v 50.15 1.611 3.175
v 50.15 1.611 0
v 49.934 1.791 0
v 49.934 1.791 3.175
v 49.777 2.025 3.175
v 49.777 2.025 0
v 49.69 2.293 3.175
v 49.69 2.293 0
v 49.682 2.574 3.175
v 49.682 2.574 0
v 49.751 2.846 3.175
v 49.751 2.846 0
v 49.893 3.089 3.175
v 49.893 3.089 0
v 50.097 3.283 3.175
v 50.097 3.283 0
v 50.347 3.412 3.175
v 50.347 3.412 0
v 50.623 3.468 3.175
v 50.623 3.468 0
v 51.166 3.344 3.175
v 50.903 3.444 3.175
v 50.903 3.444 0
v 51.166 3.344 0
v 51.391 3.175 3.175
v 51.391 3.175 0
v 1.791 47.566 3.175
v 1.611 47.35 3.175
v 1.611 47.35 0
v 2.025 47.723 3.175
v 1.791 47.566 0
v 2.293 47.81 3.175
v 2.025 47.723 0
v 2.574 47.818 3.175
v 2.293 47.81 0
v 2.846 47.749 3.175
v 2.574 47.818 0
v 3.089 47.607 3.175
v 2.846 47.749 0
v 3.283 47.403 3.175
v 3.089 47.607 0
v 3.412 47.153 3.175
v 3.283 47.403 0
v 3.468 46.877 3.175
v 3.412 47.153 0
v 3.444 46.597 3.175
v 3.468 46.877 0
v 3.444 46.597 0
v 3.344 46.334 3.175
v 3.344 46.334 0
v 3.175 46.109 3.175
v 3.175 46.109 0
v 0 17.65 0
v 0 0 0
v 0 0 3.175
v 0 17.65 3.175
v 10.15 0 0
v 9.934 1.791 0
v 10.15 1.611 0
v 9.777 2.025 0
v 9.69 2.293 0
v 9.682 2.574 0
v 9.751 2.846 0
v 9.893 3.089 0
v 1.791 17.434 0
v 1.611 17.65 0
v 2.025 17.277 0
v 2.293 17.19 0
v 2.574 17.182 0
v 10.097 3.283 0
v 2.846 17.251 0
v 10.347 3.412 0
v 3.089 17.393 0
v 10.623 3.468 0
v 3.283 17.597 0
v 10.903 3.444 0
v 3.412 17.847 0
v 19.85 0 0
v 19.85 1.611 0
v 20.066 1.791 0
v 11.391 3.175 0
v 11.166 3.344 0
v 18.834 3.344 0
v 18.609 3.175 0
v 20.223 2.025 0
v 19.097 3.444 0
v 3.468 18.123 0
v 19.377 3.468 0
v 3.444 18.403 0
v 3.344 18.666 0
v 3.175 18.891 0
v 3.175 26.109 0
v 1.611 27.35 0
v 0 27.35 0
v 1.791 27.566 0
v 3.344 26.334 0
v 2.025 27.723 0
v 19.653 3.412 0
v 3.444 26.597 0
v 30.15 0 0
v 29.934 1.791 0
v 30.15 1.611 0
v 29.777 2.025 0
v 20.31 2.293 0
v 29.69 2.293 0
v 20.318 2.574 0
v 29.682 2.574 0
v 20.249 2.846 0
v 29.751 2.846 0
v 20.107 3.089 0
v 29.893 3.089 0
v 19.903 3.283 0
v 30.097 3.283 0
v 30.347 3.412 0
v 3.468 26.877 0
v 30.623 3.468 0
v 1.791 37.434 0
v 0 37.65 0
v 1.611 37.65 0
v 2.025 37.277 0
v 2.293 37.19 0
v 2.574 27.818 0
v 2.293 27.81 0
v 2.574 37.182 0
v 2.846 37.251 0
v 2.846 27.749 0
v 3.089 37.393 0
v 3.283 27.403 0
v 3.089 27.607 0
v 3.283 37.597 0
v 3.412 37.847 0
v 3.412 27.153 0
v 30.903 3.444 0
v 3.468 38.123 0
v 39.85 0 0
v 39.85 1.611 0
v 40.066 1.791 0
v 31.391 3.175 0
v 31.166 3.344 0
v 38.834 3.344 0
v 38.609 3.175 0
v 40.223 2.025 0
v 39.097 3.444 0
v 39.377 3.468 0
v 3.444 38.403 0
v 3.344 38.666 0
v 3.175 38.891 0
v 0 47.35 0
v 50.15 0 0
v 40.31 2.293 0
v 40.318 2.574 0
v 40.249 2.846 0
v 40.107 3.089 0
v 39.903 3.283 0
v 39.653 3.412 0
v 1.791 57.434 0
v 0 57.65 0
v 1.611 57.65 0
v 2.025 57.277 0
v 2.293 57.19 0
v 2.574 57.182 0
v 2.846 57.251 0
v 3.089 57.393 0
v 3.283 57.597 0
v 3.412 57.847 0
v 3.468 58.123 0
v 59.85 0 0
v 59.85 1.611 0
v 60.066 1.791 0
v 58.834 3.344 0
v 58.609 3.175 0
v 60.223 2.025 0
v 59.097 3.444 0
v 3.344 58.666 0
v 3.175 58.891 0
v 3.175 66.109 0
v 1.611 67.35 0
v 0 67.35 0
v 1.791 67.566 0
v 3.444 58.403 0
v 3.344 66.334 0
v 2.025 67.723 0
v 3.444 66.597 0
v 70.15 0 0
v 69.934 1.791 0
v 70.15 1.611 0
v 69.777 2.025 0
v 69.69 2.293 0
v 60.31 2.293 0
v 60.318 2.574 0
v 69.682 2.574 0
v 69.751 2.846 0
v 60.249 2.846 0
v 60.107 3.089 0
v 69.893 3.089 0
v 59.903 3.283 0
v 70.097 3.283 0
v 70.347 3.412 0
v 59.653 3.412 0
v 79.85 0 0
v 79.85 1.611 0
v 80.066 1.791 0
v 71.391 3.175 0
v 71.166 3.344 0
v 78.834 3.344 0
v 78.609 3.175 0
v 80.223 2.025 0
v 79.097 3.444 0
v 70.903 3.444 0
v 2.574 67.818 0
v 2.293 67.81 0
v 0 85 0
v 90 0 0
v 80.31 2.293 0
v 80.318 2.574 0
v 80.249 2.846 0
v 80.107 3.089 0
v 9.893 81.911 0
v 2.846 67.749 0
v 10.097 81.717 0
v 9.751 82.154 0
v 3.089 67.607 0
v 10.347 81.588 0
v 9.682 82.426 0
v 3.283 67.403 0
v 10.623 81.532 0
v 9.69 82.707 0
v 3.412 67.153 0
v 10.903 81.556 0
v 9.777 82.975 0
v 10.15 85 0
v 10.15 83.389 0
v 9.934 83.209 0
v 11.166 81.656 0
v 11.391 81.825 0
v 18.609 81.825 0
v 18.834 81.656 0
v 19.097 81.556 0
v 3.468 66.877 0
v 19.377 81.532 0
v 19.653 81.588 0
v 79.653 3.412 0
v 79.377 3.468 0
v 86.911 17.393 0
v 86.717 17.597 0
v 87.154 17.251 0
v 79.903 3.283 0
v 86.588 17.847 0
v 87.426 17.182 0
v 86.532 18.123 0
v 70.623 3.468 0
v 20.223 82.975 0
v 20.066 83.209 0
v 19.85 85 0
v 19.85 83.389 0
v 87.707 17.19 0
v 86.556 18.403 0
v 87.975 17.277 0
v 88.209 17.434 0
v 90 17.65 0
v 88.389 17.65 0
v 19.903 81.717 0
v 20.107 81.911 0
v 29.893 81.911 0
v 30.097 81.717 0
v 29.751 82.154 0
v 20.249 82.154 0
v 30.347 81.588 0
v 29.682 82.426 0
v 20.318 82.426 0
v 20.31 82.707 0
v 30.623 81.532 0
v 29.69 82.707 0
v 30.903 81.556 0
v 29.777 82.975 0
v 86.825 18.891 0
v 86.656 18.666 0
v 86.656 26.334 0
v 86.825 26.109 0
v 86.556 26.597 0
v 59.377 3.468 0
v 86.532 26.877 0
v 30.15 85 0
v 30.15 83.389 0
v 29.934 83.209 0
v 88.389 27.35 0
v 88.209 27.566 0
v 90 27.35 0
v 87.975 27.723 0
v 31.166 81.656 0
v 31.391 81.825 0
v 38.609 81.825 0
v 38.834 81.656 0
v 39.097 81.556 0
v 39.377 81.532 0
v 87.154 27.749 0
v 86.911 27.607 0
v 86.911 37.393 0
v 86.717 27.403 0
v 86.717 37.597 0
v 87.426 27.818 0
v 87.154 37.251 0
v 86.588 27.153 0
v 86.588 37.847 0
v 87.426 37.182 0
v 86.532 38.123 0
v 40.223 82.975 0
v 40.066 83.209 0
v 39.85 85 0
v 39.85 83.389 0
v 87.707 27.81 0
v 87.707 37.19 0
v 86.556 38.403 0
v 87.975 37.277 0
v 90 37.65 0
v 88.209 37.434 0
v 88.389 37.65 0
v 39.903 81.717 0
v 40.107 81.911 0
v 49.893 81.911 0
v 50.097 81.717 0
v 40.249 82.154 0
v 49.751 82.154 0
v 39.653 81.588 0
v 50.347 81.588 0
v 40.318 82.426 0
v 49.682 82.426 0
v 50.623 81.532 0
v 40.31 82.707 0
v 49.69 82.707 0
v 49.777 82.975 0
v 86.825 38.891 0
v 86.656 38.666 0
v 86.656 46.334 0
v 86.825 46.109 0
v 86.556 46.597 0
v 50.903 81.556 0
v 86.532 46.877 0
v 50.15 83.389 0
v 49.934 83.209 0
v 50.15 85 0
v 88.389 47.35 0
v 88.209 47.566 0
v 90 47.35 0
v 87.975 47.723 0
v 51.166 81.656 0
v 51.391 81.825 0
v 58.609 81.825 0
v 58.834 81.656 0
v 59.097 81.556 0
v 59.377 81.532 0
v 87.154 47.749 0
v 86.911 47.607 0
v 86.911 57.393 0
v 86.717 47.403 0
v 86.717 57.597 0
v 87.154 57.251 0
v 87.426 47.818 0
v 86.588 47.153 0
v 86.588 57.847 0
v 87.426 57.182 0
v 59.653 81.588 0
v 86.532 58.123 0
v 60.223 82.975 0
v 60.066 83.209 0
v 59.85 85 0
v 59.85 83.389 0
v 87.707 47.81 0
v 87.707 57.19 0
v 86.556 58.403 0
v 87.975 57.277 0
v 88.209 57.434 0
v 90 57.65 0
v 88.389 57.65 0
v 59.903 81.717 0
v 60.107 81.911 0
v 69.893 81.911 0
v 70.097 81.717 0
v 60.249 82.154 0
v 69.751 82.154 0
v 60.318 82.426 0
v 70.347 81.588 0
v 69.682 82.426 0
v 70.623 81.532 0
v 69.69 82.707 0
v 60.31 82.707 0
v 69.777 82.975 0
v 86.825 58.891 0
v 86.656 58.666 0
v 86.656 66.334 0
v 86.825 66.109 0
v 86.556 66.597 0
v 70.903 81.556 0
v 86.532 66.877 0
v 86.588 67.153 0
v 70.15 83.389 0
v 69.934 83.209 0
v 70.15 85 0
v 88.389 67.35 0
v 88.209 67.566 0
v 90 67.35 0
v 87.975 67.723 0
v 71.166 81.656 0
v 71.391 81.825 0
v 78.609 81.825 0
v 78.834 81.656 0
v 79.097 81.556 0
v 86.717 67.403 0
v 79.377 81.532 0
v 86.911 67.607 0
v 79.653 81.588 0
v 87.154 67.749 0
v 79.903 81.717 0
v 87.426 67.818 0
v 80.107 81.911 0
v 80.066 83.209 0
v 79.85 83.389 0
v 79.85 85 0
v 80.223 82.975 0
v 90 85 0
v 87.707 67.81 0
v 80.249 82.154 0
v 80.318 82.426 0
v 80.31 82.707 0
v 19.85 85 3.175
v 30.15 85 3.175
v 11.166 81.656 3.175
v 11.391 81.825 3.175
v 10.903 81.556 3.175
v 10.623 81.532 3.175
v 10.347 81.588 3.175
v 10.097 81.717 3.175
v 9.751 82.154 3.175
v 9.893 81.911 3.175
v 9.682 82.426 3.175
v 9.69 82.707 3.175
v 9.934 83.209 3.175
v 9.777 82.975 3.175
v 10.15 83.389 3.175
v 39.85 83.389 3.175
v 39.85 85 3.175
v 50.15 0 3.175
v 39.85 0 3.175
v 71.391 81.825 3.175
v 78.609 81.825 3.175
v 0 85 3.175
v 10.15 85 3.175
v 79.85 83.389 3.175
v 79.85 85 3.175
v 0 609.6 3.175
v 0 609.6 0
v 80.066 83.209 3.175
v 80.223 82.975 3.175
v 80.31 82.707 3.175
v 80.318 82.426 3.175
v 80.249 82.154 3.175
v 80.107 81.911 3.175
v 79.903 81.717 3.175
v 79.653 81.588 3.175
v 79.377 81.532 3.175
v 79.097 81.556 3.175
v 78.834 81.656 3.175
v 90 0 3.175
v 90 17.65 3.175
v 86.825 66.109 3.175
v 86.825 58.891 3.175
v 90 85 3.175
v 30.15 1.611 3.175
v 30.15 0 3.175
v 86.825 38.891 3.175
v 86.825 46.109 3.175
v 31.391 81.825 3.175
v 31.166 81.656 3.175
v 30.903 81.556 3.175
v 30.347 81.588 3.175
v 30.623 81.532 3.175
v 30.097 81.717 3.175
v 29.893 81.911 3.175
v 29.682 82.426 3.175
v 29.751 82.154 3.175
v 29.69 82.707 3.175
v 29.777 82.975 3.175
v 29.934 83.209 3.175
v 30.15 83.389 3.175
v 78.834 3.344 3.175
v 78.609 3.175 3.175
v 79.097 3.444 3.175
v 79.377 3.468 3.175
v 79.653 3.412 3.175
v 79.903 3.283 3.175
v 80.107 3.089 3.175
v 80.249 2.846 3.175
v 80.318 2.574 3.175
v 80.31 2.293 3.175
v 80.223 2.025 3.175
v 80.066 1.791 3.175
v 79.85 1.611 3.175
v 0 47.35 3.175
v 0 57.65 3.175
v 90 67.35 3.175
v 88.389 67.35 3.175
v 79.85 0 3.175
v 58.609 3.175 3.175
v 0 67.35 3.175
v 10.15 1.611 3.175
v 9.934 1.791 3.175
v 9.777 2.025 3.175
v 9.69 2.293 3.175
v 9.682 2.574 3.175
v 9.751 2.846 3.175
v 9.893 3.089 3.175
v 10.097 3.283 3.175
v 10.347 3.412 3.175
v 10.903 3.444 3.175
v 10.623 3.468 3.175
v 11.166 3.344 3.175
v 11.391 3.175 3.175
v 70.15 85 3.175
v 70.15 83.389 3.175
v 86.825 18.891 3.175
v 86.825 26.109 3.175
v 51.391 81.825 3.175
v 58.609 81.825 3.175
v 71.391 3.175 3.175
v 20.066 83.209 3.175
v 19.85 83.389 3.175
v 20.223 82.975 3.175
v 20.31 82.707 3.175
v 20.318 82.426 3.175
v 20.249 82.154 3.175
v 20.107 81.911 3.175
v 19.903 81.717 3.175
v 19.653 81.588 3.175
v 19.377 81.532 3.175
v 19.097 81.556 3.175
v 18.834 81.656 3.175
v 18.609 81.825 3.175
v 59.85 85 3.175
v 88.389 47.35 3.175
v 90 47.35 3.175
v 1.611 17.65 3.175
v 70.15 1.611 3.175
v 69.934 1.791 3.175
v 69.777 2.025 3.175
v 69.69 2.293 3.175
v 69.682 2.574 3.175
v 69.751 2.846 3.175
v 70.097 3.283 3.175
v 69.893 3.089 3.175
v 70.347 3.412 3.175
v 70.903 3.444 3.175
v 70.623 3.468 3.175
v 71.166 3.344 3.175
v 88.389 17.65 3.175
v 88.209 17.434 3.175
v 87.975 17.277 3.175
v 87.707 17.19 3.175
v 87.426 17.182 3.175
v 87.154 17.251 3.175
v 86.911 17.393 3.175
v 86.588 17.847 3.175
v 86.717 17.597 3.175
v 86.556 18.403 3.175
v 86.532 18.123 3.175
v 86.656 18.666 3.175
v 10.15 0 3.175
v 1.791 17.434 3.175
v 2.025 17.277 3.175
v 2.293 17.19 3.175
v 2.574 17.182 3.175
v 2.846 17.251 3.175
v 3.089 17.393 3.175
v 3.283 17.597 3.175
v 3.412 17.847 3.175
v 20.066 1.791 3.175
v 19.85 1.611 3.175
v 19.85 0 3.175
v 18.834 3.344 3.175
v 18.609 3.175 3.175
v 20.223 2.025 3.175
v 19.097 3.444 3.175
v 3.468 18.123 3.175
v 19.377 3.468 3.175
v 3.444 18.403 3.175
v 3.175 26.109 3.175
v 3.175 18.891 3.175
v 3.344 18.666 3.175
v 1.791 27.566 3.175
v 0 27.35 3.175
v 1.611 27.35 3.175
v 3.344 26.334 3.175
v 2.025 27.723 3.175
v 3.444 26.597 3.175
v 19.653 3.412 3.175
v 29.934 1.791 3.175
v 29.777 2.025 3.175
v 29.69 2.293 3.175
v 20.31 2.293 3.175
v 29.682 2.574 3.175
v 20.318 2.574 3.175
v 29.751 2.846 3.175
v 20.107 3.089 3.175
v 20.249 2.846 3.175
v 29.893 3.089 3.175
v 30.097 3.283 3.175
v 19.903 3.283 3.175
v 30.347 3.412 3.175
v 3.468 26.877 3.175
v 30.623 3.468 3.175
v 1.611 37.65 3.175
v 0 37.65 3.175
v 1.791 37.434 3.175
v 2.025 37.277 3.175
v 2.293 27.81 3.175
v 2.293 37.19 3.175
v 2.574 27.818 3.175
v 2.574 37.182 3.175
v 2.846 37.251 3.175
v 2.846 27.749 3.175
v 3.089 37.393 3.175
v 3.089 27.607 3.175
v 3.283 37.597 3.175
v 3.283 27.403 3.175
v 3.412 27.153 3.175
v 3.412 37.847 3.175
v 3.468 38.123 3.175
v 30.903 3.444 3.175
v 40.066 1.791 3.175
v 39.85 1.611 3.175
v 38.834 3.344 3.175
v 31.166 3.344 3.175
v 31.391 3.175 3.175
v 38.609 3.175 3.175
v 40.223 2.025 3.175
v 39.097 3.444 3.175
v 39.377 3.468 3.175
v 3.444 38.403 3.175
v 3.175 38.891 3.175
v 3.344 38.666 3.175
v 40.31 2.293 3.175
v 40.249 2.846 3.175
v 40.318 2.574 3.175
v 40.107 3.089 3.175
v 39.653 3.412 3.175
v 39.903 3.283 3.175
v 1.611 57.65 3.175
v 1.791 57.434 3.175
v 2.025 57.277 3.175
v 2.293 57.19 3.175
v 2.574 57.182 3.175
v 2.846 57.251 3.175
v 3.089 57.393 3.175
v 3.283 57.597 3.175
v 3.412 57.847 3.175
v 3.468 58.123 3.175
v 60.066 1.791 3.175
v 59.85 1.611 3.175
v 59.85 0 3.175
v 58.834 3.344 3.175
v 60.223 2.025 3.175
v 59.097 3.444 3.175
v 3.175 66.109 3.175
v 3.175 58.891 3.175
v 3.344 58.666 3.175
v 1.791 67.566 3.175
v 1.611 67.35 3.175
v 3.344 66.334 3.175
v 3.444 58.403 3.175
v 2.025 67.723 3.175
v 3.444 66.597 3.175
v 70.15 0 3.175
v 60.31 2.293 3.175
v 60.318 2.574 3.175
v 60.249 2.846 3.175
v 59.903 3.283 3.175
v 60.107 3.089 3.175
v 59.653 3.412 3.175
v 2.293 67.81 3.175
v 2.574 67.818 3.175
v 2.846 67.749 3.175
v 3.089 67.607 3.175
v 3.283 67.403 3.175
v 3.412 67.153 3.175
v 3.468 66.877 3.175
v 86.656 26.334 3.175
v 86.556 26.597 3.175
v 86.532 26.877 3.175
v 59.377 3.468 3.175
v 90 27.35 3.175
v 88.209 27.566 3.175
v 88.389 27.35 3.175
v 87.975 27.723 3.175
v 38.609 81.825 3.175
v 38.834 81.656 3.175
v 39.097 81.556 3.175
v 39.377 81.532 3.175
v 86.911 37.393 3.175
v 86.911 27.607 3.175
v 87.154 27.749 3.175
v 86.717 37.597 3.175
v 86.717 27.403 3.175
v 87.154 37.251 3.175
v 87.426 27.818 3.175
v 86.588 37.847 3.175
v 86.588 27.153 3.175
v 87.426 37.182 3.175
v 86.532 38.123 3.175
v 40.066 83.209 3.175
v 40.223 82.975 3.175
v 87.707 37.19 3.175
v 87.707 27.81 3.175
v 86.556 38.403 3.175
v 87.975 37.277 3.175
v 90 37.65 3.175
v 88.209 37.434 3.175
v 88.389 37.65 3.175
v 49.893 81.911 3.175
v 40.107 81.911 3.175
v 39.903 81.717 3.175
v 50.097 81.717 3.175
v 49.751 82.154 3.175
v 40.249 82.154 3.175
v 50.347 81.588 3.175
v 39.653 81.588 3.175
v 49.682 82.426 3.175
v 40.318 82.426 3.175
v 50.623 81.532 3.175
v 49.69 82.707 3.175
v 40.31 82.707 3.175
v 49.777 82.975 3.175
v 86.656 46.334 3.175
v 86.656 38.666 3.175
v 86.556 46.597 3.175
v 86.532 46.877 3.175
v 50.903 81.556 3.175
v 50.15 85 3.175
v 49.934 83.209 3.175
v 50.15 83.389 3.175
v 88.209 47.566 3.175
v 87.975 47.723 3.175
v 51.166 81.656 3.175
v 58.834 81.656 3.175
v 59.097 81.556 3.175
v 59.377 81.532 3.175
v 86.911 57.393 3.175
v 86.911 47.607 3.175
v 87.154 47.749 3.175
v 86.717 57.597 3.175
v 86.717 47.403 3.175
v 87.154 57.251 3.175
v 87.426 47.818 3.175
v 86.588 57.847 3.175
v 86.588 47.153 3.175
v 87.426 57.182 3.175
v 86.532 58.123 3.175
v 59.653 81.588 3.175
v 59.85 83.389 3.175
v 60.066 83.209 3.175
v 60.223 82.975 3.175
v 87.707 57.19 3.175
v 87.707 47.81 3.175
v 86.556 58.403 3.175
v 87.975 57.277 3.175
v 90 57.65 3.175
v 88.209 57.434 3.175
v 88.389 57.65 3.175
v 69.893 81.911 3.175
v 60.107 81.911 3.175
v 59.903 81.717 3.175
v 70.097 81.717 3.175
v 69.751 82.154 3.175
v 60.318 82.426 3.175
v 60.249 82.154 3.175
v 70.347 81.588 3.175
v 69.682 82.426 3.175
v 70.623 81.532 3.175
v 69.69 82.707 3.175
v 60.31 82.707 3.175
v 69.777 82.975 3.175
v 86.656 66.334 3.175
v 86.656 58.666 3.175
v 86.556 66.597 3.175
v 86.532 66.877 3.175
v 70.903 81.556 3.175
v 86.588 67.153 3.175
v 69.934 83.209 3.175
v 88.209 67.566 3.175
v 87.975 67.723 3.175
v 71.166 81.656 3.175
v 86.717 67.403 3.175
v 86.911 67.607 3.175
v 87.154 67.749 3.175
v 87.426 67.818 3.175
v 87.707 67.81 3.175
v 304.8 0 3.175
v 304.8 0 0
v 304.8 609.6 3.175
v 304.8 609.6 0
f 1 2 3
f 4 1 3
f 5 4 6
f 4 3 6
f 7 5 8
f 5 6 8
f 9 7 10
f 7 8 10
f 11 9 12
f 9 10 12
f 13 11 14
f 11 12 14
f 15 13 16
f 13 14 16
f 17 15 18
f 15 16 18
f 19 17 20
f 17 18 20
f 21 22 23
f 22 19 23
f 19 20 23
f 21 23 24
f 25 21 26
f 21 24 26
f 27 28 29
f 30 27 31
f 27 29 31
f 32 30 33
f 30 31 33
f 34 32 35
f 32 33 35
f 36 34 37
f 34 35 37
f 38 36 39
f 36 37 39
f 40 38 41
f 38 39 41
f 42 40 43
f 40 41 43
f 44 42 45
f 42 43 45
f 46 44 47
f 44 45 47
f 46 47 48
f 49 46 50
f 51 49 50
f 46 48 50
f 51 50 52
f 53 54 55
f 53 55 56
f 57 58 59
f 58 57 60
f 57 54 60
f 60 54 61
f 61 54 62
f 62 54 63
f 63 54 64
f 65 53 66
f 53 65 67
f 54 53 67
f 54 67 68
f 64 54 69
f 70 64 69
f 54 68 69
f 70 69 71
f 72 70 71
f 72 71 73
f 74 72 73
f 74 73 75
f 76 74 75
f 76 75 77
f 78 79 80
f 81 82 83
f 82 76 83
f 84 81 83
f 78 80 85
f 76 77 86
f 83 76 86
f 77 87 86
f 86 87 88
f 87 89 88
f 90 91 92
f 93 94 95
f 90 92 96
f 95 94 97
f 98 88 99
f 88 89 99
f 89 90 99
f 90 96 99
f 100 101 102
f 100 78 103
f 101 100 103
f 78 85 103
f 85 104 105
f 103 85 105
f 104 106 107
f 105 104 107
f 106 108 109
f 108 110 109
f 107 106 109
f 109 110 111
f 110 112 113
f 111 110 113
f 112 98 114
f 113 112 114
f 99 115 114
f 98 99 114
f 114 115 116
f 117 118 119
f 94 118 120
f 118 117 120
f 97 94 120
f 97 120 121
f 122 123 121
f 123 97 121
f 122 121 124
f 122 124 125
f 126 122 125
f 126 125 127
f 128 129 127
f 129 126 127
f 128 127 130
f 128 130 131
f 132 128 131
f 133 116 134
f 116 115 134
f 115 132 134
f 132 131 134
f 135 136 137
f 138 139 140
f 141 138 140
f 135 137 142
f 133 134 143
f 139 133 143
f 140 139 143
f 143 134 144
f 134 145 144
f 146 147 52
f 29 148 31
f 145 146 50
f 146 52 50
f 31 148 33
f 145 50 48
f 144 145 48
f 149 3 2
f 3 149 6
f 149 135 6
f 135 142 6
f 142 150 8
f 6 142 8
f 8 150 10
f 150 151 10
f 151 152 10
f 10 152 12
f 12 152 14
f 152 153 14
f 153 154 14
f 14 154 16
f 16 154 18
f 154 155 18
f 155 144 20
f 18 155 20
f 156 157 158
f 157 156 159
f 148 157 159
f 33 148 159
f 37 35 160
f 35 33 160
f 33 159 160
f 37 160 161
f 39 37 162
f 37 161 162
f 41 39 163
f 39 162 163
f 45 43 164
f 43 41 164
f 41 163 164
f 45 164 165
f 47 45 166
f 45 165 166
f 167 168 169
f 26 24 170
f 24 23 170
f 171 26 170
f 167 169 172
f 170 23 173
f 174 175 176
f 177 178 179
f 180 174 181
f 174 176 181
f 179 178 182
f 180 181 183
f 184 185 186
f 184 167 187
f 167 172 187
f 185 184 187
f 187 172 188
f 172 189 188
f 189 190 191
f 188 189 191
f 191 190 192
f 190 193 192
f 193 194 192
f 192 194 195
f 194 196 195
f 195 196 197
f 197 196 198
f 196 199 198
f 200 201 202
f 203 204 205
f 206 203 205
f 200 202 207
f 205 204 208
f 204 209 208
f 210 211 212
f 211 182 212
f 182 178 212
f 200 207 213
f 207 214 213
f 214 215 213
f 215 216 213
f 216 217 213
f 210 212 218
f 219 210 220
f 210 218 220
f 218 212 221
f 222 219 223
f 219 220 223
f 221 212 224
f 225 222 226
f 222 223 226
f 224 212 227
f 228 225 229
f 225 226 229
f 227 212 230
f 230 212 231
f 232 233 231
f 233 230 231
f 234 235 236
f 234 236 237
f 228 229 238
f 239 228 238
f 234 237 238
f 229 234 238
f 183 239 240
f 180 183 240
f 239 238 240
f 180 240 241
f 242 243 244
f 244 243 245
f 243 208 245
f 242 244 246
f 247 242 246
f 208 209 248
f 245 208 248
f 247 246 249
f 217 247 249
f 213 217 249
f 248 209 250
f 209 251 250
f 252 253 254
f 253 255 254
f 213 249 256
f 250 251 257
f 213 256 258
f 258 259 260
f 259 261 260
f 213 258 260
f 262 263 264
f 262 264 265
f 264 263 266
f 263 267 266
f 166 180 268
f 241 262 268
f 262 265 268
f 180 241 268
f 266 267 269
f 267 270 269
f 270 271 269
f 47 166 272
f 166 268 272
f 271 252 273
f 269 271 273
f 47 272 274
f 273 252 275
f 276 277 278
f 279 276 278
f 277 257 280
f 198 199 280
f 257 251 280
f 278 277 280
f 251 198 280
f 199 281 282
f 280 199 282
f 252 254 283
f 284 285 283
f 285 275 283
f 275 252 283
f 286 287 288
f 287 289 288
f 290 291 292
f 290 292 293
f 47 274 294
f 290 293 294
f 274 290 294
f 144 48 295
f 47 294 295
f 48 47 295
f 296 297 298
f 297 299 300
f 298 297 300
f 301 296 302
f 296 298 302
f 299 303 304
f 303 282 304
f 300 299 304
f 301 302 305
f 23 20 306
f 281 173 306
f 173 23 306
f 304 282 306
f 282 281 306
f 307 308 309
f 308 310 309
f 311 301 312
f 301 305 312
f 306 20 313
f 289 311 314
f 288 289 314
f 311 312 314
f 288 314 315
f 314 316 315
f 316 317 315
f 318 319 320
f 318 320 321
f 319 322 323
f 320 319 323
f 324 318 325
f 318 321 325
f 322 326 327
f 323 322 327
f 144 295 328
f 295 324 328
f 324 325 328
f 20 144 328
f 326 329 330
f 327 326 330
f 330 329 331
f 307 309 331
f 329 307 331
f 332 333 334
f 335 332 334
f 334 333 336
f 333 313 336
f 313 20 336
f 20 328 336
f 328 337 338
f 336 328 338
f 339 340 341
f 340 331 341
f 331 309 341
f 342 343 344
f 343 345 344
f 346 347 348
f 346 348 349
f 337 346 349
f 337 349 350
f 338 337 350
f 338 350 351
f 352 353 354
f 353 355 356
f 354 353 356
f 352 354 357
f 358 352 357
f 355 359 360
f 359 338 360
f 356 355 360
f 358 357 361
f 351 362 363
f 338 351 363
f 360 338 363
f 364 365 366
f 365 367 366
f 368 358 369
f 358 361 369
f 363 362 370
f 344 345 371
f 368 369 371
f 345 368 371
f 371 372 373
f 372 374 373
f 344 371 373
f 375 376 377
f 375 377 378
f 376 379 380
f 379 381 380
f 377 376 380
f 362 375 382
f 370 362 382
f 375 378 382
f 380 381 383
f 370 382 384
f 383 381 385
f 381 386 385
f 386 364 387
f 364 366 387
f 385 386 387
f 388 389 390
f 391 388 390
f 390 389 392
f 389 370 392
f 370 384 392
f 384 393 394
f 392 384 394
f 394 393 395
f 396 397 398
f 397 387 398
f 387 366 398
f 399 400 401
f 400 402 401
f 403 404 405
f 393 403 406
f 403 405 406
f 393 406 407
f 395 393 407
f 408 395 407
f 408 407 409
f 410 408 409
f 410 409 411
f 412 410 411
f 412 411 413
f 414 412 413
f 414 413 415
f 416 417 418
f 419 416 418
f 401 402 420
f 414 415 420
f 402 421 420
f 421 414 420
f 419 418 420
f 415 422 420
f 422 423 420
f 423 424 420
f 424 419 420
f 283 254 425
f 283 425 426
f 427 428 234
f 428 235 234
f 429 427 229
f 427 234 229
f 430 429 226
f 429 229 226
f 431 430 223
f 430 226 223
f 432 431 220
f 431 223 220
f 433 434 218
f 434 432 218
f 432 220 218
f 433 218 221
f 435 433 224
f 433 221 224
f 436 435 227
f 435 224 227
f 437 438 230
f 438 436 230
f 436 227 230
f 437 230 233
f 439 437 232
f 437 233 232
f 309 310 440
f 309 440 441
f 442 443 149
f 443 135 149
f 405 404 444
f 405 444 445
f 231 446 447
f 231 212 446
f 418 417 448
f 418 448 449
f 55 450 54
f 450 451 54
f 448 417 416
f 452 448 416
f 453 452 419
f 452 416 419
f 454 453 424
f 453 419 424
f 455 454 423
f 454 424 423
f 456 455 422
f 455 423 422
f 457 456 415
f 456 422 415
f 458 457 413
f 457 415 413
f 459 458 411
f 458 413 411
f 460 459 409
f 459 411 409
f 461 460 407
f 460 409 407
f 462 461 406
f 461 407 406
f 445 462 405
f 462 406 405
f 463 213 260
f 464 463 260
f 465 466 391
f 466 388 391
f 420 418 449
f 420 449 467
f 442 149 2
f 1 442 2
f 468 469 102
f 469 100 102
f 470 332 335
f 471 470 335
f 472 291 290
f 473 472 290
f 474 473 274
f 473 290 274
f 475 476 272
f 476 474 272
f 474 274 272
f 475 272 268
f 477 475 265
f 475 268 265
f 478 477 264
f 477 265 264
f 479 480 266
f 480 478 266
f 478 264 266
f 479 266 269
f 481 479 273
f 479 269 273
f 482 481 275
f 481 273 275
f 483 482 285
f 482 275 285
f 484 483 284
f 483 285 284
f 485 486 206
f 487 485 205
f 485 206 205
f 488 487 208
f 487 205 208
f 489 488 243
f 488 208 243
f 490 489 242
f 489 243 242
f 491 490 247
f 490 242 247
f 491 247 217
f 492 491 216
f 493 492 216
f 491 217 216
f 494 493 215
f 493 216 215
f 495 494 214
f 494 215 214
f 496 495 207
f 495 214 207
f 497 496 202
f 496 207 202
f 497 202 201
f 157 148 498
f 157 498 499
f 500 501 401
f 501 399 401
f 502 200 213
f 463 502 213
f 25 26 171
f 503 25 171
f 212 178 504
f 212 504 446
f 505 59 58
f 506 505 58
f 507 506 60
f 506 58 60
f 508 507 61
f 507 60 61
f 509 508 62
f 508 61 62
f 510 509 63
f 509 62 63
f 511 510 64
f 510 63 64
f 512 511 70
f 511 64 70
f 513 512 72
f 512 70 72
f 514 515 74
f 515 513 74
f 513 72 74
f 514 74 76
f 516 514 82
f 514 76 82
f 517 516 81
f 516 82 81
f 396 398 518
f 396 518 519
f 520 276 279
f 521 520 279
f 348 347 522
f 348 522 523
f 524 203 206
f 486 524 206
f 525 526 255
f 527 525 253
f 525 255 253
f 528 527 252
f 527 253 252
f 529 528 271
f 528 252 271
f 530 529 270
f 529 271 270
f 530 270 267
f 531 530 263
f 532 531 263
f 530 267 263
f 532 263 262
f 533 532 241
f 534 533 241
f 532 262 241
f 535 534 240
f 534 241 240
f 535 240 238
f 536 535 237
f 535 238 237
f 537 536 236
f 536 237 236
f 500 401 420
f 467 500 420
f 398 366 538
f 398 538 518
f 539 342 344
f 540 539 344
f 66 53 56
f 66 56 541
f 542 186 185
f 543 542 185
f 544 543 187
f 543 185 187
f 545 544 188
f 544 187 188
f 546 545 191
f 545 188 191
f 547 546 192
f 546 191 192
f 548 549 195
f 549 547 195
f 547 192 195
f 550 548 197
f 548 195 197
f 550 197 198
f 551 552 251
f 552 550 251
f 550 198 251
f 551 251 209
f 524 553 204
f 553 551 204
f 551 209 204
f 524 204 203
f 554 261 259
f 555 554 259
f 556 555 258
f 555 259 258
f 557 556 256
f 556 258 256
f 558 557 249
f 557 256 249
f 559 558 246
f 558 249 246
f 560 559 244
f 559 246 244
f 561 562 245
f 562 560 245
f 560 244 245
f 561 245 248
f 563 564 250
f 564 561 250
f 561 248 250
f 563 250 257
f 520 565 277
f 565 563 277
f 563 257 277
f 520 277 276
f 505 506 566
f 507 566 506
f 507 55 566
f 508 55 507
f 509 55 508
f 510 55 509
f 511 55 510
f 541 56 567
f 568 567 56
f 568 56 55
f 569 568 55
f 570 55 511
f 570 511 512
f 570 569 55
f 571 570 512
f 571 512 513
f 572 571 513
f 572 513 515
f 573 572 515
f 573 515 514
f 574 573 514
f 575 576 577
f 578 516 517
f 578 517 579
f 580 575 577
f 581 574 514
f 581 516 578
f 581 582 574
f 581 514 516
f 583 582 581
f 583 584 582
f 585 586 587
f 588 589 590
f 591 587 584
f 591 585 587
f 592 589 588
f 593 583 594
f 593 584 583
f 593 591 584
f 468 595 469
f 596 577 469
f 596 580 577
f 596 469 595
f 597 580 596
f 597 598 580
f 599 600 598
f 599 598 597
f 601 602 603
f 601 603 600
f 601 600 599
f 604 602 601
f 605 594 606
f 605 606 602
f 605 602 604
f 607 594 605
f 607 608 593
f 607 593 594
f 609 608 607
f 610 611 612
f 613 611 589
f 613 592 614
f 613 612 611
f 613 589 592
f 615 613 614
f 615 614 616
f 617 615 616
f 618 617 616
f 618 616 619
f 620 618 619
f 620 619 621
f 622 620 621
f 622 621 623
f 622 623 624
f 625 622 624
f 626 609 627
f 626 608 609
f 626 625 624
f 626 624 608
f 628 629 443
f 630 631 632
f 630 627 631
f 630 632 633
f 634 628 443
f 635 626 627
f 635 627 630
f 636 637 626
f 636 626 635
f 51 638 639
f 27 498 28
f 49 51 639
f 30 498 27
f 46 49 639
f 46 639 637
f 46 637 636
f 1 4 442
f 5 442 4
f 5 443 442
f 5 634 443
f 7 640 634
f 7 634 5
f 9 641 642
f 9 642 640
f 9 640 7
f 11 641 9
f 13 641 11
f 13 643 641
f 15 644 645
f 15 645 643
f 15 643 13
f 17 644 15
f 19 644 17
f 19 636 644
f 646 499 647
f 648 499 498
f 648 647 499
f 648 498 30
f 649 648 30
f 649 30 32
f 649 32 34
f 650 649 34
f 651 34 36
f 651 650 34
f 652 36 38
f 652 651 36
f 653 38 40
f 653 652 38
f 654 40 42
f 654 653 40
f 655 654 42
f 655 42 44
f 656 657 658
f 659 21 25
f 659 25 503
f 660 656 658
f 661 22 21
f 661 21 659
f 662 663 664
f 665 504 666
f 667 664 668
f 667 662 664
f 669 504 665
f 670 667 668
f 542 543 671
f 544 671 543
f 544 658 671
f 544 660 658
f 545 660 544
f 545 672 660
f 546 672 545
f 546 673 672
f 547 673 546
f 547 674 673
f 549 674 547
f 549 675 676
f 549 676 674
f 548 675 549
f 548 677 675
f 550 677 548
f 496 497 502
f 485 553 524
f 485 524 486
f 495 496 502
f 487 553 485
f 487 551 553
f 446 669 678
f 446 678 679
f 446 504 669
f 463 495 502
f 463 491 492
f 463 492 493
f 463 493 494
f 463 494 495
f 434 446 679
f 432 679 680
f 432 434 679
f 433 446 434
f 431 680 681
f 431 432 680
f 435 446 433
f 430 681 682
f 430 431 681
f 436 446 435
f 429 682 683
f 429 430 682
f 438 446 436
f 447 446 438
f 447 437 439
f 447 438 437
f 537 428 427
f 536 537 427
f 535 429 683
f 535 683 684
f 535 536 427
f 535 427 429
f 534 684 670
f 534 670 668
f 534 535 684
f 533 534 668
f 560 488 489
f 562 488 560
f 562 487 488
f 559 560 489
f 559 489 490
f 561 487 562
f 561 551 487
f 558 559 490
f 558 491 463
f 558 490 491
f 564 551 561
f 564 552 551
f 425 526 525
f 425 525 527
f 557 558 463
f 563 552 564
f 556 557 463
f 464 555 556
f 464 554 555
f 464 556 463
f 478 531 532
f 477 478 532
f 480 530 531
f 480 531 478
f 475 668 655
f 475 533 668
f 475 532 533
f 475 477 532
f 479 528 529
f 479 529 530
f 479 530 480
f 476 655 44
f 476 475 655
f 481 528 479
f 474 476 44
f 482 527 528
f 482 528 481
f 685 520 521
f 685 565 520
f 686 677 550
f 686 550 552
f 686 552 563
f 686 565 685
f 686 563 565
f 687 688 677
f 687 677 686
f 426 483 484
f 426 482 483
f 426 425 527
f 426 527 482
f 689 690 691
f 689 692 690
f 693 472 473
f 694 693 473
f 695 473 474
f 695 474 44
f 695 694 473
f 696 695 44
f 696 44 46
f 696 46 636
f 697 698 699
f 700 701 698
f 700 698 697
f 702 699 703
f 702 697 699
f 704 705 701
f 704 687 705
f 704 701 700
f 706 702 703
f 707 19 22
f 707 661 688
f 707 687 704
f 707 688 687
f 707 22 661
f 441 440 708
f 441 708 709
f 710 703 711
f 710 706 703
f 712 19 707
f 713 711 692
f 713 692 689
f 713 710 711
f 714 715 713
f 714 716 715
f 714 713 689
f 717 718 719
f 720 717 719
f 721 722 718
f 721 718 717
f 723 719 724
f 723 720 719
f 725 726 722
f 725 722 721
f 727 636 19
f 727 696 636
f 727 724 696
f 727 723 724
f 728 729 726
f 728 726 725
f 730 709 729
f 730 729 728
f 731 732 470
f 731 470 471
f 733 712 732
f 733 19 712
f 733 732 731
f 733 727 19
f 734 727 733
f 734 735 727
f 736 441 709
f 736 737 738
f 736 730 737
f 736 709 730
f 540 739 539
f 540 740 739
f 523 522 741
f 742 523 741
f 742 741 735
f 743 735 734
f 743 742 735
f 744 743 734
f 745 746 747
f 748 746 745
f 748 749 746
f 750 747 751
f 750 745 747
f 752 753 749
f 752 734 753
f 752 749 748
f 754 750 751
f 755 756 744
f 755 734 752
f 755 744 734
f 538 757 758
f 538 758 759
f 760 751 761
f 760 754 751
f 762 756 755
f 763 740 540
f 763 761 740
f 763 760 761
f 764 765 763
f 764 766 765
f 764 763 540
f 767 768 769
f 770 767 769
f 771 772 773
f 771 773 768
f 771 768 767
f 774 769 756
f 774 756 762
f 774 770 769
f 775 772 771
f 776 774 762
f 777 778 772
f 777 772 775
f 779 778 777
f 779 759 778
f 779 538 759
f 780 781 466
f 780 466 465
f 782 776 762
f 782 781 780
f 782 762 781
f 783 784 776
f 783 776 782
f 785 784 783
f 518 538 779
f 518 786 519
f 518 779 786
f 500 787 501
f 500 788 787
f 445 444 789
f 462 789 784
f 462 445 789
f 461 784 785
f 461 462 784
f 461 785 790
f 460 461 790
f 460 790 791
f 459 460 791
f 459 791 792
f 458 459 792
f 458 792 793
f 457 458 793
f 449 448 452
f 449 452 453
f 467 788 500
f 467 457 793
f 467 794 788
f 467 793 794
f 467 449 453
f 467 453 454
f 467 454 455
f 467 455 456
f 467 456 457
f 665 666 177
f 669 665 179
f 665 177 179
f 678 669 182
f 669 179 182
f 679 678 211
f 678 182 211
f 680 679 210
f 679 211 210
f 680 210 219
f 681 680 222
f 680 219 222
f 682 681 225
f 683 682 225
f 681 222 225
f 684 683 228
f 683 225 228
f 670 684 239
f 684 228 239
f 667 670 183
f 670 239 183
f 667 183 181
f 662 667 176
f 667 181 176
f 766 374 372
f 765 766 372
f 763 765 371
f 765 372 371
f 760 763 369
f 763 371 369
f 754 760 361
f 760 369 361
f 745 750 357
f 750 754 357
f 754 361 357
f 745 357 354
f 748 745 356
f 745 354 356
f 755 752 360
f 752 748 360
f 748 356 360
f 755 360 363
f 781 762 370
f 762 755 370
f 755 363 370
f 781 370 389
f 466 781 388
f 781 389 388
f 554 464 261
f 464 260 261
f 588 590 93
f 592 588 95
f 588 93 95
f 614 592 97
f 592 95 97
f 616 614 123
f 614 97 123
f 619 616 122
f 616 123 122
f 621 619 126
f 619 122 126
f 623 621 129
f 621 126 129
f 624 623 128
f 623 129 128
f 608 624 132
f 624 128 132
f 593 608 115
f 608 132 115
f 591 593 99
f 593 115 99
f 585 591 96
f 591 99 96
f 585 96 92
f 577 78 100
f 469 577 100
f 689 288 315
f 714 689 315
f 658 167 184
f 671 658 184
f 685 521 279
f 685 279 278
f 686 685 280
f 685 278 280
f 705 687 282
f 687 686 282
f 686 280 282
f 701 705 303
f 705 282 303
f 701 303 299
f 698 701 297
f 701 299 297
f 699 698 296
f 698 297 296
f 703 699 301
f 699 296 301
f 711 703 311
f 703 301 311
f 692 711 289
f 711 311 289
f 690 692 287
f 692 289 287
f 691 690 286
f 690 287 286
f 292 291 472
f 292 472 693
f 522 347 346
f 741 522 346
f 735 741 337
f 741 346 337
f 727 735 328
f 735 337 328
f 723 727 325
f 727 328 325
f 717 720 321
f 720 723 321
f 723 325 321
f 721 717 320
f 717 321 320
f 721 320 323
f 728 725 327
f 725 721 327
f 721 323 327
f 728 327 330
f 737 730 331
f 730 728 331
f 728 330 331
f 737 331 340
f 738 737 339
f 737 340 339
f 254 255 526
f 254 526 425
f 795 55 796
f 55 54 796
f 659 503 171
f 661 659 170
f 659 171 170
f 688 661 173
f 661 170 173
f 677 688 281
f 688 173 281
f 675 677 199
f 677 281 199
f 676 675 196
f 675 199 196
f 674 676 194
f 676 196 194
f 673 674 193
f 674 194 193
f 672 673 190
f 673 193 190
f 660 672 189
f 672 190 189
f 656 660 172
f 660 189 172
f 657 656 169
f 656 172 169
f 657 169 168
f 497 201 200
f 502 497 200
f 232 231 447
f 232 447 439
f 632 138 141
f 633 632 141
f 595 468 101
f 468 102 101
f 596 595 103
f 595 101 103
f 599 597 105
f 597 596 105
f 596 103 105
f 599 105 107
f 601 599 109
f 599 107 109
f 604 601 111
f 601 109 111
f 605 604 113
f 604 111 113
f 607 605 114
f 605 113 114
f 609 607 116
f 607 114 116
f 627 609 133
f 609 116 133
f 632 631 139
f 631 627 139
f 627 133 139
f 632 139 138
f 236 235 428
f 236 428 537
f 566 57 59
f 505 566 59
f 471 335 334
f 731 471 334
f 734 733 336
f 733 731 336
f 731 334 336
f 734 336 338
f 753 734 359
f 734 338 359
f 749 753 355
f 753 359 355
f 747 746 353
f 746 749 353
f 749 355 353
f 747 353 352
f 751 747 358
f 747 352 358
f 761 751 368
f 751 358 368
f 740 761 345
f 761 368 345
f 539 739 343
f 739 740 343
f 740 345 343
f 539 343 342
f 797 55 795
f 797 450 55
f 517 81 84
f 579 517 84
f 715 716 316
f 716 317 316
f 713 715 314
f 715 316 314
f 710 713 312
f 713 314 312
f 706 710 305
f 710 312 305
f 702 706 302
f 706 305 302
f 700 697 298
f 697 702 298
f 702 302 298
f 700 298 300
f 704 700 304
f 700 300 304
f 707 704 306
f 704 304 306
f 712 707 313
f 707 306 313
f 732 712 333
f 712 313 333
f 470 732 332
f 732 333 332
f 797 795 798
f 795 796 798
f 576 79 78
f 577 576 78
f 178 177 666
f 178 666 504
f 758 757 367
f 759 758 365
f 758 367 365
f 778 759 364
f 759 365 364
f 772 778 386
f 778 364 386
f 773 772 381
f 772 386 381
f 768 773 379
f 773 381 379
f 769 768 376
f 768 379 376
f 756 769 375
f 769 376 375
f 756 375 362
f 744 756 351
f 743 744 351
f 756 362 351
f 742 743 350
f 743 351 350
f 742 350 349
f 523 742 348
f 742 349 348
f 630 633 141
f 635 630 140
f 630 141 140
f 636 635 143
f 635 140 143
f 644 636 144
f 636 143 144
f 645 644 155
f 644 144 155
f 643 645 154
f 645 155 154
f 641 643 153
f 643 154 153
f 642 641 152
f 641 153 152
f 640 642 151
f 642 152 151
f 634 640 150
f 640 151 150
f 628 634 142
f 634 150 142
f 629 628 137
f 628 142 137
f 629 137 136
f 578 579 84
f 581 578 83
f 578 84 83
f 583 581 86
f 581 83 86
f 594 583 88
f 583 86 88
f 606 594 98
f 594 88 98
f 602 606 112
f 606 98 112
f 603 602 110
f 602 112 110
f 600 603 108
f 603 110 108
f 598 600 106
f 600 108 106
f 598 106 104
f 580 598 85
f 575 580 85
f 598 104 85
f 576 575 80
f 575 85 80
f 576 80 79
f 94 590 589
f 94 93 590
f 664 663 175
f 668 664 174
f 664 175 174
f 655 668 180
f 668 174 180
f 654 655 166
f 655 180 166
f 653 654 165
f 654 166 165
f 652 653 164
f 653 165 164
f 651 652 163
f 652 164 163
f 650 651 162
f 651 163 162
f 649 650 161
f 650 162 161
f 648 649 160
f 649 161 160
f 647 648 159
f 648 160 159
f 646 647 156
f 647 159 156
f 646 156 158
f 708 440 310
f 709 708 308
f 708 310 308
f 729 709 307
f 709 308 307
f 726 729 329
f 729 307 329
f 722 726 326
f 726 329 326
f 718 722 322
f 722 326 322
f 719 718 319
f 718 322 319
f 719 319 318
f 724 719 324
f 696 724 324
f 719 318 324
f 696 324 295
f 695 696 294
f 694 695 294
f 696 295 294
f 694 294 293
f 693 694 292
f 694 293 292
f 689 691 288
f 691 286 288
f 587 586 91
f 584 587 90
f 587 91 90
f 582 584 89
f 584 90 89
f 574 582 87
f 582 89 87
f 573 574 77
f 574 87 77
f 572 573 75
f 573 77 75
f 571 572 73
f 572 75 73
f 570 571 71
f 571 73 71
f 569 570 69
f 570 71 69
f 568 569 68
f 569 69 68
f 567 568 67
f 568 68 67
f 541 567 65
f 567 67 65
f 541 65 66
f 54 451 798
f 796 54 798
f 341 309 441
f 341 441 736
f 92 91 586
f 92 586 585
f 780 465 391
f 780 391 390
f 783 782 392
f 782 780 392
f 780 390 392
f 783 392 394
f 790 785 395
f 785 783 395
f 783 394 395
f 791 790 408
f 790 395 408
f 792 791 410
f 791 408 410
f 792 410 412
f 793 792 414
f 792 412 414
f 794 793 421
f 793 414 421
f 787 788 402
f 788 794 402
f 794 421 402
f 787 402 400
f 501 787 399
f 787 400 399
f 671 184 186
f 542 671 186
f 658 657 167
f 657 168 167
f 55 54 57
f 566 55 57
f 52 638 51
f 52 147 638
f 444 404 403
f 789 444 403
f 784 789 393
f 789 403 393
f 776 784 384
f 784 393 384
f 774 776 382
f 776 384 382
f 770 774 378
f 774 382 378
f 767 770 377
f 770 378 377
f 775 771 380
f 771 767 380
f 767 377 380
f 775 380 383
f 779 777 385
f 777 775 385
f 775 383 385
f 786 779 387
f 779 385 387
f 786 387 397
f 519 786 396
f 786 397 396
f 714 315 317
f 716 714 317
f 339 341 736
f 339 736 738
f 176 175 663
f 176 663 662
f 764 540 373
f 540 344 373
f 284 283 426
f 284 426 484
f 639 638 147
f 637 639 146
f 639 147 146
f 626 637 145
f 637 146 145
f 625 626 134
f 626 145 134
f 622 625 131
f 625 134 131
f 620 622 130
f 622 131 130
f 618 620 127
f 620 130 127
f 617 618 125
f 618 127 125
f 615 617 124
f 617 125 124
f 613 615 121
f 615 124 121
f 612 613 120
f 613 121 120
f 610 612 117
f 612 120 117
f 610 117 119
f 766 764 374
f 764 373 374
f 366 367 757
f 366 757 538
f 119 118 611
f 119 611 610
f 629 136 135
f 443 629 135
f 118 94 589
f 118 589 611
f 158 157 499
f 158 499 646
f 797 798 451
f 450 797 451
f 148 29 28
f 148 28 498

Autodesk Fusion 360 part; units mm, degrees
sketch "b  stock" plane through (0, 0, 0) normal (0, 0, 1) x (1, 0, 0)
  line L0 (0, 0) -> (304.8, 0)
  line L1 (304.8, 0) -> (304.8, 609.6)
  line L2 (304.8, 609.6) -> (0, 609.6)
  line L3 (0, 609.6) -> (0, 0)
extrude "b  stock body extrude Feature" add sketch "b  stock" along normal blind 3.175 makes body 1
sketch "b  layout" plane through (0, 0, 0) normal (0, 0, 1) x (1, 0, 0)
  line L0 (0, 0) -> (90, 0)
  line L1 (90, 0) -> (90, 85)
  line L2 (90, 85) -> (0, 85)
  line L3 (0, 85) -> (0, 0)
  line L4 (92.01, 0) -> (182.01, 0)
  line L5 (182.01, 0) -> (182.01, 85)
  line L6 (182.01, 85) -> (92.01, 85)
  line L7 (92.01, 85) -> (92.01, 0)
  line L8 (184.02, 0) -> (234.02, 0)
  line L9 (234.02, 0) -> (234.02, 85)
  line L10 (234.02, 85) -> (184.02, 85)
  line L11 (184.02, 85) -> (184.02, 0)
  line L12 (236.03, 0) -> (286.03, 0)
  line L13 (286.03, 0) -> (286.03, 85)
  line L14 (286.03, 85) -> (236.03, 85)
  line L15 (236.03, 85) -> (236.03, 0)
  line L16 (0, 87.01) -> (90, 87.01)
  line L17 (90, 87.01) -> (90, 137.01)
  line L18 (90, 137.01) -> (0, 137.01)
  line L19 (0, 137.01) -> (0, 87.01)
  line L20 (92.01, 87.01) -> (182.01, 87.01)
  line L21 (182.01, 87.01) -> (182.01, 137.01)
  line L22 (182.01, 137.01) -> (92.01, 137.01)
  line L23 (92.01, 137.01) -> (92.01, 87.01)
sketch "b top lines" plane through (0, 0, 0) normal (0, 0, 1) x (1, 0, 0)
  line L0 (0, 0) -> (10.15, 0)
  line L1 (10.15, 0) -> (10.15, 3.175)
  line L2 (10.15, 3.175) -> (19.85, 3.175)
  line L3 (19.85, 3.175) -> (19.85, 0)
  line L4 (19.85, 0) -> (30.15, 0)
  line L5 (30.15, 0) -> (30.15, 3.175)
  line L6 (30.15, 3.175) -> (39.85, 3.175)
  line L7 (39.85, 3.175) -> (39.85, 0)
  line L8 (39.85, 0) -> (50.15, 0)
  line L9 (50.15, 0) -> (50.15, 3.175)
  line L10 (50.15, 3.175) -> (59.85, 3.175)
  line L11 (59.85, 3.175) -> (59.85, 0)
  line L12 (59.85, 0) -> (70.15, 0)
  line L13 (70.15, 0) -> (70.15, 3.175)
  line L14 (70.15, 3.175) -> (79.85, 3.175)
  line L15 (79.85, 3.175) -> (79.85, 0)
  line L16 (79.85, 0) -> (90, 0)
  line L17 (90, 0) -> (90, 17.65)
  line L18 (90, 17.65) -> (86.825, 17.65)
  line L19 (86.825, 17.65) -> (86.825, 27.35)
  line L20 (86.825, 27.35) -> (90, 27.35)
  line L21 (90, 27.35) -> (90, 37.65)
  line L22 (90, 37.65) -> (86.825, 37.65)
  line L23 (86.825, 37.65) -> (86.825, 47.35)
  line L24 (86.825, 47.35) -> (90, 47.35)
  line L25 (90, 47.35) -> (90, 57.65)
  line L26 (90, 57.65) -> (86.825, 57.65)
  line L27 (86.825, 57.65) -> (86.825, 67.35)
  line L28 (86.825, 67.35) -> (90, 67.35)
  line L29 (90, 67.35) -> (90, 85)
  line L30 (0, 85) -> (10.15, 85)
  line L31 (10.15, 85) -> (10.15, 81.825)
  line L32 (10.15, 81.825) -> (19.85, 81.825)
  line L33 (19.85, 81.825) -> (19.85, 85)
  line L34 (19.85, 85) -> (30.15, 85)
  line L35 (30.15, 85) -> (30.15, 81.825)
  line L36 (30.15, 81.825) -> (39.85, 81.825)
  line L37 (39.85, 81.825) -> (39.85, 85)
  line L38 (39.85, 85) -> (50.15, 85)
  line L39 (50.15, 85) -> (50.15, 81.825)
  line L40 (50.15, 81.825) -> (59.85, 81.825)
  line L41 (59.85, 81.825) -> (59.85, 85)
  line L42 (59.85, 85) -> (70.15, 85)
  line L43 (70.15, 85) -> (70.15, 81.825)
  line L44 (70.15, 81.825) -> (79.85, 81.825)
  line L45 (79.85, 81.825) -> (79.85, 85)
  line L46 (79.85, 85) -> (90, 85)
  line L47 (0, 0) -> (0, 17.65)
  line L48 (0, 17.65) -> (3.175, 17.65)
  line L49 (3.175, 17.65) -> (3.175, 27.35)
  line L50 (3.175, 27.35) -> (0, 27.35)
  line L51 (0, 27.35) -> (0, 37.65)
  line L52 (0, 37.65) -> (3.175, 37.65)
  line L53 (3.175, 37.65) -> (3.175, 47.35)
  line L54 (3.175, 47.35) -> (0, 47.35)
  line L55 (0, 47.35) -> (0, 57.65)
  line L56 (0, 57.65) -> (3.175, 57.65)
  line L57 (3.175, 57.65) -> (3.175, 67.35)
  line L58 (3.175, 67.35) -> (0, 67.35)
  line L59 (0, 67.35) -> (0, 85)
sketch "b top circles" plane through (0, 0, 0) normal (0, 0, 1) x (1, 0, 0)
  circle A0 centre (10.6806, 2.4644) radius 1.005
  circle A1 centre (19.3194, 2.4644) radius 1.005
  circle A2 centre (30.6806, 2.4644) radius 1.005
  circle A3 centre (39.3194, 2.4644) radius 1.005
  circle A4 centre (50.6806, 2.4644) radius 1.005
  circle A5 centre (59.3194, 2.4644) radius 1.005
  circle A6 centre (70.6806, 2.4644) radius 1.005
  circle A7 centre (79.3194, 2.4644) radius 1.005
  circle A8 centre (87.5356, 18.1806) radius 1.005
  circle A9 centre (87.5356, 26.8194) radius 1.005
  circle A10 centre (87.5356, 38.1806) radius 1.005
  circle A11 centre (87.5356, 46.8194) radius 1.005
  circle A12 centre (87.5356, 58.1806) radius 1.005
  circle A13 centre (87.5356, 66.8194) radius 1.005
  circle A14 centre (10.6806, 82.5356) radius 1.005
  circle A15 centre (19.3194, 82.5356) radius 1.005
  circle A16 centre (30.6806, 82.5356) radius 1.005
  circle A17 centre (39.3194, 82.5356) radius 1.005
  circle A18 centre (50.6806, 82.5356) radius 1.005
  circle A19 centre (59.3194, 82.5356) radius 1.005
  circle A20 centre (70.6806, 82.5356) radius 1.005
  circle A21 centre (79.3194, 82.5356) radius 1.005
  circle A22 centre (2.4644, 18.1806) radius 1.005
  circle A23 centre (2.4644, 26.8194) radius 1.005
  circle A24 centre (2.4644, 38.1806) radius 1.005
  circle A25 centre (2.4644, 46.8194) radius 1.005
  circle A26 centre (2.4644, 58.1806) radius 1.005
  circle A27 centre (2.4644, 66.8194) radius 1.005
extrude "b top lines lines extrude Feature" add sketch "b top lines" along normal blind 3.175 separate body makes body 2
extrude "b top circles circles extrude Feature" add sketch "b top circles" along normal blind 3.175 separate body makes body 3 at (3.4644, 58.0806, 2.1167) makes body 4 at (3.4644, 38.0806, 2.1167) makes body 5 at (3.4644, 18.0806, 2.1167) makes body 6 at (69.7363, 82.8794, 2.1167) makes body 7 at (49.7363, 82.8794, 2.1167) makes body 8 at (31.6067, 82.926, 2.1167) makes body 9 at (9.7363, 82.8794, 2.1167) makes body 10 at (86.5913, 67.1631, 2.1167) makes body 11 at (87.2156, 45.8667, 1.0583) makes body 12 at (87.2156, 25.8667, 1.0583) makes body 13 at (78.9993, 1.5117, 1.0583) makes body 14 at (59.2943, 3.469, 2.1167) makes body 15 at (39.2943, 3.469, 2.1167) makes body 16 at (20.3194, 2.3643, 2.1167) makes body 17 at (31.6806, 2.3643, 2.1167) makes body 18 at (50.6556, 3.469, 2.1167) makes body 19 at (70.3606, 1.5117, 1.0583) makes body 20 at (87.2156, 17.228, 1.0583) makes body 21 at (87.2156, 37.228, 1.0583) makes body 22 at (87.2156, 57.228, 1.0583) makes body 23 at (11.6806, 2.3643, 2.1167) makes body 24 at (20.2454, 82.926, 2.1167) makes body 25 at (38.375, 82.8794, 2.1167) makes body 26 at (58.375, 82.8794, 2.1167) makes body 27 at (78.375, 82.8794, 2.1167) makes body 28 at (3.4644, 26.7193, 2.1167) makes body 29 at (3.4644, 46.7193, 2.1167) makes body 30 at (3.3904, 67.2097, 2.1167)
combine "b top lines final combine feature" operation cut target body 2 tool bodies 3 4 5 6 7 8 9 10 11 12 13 14 15 16 17 18 19 20 21 22 23 24 25 26 27 28 29 30
equation "d1163 = length"
equation "d1817 = depth"
equation "d289 = platformGrommetMountDiameter"
equation "d422 = length"
equation "d423 = depth"
equation "d843 = toolDiameter"
equation "d1634 = pcbMountHoles"
equation "d1797 = ( depth - 26 mm ) / 2"
equation "d1798 = ( length - 58 mm ) / 2"
equation "d492 = length"
equation "d493 = height"
equation "d502 = length"
equation "d503 = height"
equation "d1827 = depth"
equation "d1829 = ventDiameter"
equation "d910 = depth"
equation "d911 = height"
equation "d1819 = ventDiameter"
equation "b_ = 5 mm" comment "added by script"
